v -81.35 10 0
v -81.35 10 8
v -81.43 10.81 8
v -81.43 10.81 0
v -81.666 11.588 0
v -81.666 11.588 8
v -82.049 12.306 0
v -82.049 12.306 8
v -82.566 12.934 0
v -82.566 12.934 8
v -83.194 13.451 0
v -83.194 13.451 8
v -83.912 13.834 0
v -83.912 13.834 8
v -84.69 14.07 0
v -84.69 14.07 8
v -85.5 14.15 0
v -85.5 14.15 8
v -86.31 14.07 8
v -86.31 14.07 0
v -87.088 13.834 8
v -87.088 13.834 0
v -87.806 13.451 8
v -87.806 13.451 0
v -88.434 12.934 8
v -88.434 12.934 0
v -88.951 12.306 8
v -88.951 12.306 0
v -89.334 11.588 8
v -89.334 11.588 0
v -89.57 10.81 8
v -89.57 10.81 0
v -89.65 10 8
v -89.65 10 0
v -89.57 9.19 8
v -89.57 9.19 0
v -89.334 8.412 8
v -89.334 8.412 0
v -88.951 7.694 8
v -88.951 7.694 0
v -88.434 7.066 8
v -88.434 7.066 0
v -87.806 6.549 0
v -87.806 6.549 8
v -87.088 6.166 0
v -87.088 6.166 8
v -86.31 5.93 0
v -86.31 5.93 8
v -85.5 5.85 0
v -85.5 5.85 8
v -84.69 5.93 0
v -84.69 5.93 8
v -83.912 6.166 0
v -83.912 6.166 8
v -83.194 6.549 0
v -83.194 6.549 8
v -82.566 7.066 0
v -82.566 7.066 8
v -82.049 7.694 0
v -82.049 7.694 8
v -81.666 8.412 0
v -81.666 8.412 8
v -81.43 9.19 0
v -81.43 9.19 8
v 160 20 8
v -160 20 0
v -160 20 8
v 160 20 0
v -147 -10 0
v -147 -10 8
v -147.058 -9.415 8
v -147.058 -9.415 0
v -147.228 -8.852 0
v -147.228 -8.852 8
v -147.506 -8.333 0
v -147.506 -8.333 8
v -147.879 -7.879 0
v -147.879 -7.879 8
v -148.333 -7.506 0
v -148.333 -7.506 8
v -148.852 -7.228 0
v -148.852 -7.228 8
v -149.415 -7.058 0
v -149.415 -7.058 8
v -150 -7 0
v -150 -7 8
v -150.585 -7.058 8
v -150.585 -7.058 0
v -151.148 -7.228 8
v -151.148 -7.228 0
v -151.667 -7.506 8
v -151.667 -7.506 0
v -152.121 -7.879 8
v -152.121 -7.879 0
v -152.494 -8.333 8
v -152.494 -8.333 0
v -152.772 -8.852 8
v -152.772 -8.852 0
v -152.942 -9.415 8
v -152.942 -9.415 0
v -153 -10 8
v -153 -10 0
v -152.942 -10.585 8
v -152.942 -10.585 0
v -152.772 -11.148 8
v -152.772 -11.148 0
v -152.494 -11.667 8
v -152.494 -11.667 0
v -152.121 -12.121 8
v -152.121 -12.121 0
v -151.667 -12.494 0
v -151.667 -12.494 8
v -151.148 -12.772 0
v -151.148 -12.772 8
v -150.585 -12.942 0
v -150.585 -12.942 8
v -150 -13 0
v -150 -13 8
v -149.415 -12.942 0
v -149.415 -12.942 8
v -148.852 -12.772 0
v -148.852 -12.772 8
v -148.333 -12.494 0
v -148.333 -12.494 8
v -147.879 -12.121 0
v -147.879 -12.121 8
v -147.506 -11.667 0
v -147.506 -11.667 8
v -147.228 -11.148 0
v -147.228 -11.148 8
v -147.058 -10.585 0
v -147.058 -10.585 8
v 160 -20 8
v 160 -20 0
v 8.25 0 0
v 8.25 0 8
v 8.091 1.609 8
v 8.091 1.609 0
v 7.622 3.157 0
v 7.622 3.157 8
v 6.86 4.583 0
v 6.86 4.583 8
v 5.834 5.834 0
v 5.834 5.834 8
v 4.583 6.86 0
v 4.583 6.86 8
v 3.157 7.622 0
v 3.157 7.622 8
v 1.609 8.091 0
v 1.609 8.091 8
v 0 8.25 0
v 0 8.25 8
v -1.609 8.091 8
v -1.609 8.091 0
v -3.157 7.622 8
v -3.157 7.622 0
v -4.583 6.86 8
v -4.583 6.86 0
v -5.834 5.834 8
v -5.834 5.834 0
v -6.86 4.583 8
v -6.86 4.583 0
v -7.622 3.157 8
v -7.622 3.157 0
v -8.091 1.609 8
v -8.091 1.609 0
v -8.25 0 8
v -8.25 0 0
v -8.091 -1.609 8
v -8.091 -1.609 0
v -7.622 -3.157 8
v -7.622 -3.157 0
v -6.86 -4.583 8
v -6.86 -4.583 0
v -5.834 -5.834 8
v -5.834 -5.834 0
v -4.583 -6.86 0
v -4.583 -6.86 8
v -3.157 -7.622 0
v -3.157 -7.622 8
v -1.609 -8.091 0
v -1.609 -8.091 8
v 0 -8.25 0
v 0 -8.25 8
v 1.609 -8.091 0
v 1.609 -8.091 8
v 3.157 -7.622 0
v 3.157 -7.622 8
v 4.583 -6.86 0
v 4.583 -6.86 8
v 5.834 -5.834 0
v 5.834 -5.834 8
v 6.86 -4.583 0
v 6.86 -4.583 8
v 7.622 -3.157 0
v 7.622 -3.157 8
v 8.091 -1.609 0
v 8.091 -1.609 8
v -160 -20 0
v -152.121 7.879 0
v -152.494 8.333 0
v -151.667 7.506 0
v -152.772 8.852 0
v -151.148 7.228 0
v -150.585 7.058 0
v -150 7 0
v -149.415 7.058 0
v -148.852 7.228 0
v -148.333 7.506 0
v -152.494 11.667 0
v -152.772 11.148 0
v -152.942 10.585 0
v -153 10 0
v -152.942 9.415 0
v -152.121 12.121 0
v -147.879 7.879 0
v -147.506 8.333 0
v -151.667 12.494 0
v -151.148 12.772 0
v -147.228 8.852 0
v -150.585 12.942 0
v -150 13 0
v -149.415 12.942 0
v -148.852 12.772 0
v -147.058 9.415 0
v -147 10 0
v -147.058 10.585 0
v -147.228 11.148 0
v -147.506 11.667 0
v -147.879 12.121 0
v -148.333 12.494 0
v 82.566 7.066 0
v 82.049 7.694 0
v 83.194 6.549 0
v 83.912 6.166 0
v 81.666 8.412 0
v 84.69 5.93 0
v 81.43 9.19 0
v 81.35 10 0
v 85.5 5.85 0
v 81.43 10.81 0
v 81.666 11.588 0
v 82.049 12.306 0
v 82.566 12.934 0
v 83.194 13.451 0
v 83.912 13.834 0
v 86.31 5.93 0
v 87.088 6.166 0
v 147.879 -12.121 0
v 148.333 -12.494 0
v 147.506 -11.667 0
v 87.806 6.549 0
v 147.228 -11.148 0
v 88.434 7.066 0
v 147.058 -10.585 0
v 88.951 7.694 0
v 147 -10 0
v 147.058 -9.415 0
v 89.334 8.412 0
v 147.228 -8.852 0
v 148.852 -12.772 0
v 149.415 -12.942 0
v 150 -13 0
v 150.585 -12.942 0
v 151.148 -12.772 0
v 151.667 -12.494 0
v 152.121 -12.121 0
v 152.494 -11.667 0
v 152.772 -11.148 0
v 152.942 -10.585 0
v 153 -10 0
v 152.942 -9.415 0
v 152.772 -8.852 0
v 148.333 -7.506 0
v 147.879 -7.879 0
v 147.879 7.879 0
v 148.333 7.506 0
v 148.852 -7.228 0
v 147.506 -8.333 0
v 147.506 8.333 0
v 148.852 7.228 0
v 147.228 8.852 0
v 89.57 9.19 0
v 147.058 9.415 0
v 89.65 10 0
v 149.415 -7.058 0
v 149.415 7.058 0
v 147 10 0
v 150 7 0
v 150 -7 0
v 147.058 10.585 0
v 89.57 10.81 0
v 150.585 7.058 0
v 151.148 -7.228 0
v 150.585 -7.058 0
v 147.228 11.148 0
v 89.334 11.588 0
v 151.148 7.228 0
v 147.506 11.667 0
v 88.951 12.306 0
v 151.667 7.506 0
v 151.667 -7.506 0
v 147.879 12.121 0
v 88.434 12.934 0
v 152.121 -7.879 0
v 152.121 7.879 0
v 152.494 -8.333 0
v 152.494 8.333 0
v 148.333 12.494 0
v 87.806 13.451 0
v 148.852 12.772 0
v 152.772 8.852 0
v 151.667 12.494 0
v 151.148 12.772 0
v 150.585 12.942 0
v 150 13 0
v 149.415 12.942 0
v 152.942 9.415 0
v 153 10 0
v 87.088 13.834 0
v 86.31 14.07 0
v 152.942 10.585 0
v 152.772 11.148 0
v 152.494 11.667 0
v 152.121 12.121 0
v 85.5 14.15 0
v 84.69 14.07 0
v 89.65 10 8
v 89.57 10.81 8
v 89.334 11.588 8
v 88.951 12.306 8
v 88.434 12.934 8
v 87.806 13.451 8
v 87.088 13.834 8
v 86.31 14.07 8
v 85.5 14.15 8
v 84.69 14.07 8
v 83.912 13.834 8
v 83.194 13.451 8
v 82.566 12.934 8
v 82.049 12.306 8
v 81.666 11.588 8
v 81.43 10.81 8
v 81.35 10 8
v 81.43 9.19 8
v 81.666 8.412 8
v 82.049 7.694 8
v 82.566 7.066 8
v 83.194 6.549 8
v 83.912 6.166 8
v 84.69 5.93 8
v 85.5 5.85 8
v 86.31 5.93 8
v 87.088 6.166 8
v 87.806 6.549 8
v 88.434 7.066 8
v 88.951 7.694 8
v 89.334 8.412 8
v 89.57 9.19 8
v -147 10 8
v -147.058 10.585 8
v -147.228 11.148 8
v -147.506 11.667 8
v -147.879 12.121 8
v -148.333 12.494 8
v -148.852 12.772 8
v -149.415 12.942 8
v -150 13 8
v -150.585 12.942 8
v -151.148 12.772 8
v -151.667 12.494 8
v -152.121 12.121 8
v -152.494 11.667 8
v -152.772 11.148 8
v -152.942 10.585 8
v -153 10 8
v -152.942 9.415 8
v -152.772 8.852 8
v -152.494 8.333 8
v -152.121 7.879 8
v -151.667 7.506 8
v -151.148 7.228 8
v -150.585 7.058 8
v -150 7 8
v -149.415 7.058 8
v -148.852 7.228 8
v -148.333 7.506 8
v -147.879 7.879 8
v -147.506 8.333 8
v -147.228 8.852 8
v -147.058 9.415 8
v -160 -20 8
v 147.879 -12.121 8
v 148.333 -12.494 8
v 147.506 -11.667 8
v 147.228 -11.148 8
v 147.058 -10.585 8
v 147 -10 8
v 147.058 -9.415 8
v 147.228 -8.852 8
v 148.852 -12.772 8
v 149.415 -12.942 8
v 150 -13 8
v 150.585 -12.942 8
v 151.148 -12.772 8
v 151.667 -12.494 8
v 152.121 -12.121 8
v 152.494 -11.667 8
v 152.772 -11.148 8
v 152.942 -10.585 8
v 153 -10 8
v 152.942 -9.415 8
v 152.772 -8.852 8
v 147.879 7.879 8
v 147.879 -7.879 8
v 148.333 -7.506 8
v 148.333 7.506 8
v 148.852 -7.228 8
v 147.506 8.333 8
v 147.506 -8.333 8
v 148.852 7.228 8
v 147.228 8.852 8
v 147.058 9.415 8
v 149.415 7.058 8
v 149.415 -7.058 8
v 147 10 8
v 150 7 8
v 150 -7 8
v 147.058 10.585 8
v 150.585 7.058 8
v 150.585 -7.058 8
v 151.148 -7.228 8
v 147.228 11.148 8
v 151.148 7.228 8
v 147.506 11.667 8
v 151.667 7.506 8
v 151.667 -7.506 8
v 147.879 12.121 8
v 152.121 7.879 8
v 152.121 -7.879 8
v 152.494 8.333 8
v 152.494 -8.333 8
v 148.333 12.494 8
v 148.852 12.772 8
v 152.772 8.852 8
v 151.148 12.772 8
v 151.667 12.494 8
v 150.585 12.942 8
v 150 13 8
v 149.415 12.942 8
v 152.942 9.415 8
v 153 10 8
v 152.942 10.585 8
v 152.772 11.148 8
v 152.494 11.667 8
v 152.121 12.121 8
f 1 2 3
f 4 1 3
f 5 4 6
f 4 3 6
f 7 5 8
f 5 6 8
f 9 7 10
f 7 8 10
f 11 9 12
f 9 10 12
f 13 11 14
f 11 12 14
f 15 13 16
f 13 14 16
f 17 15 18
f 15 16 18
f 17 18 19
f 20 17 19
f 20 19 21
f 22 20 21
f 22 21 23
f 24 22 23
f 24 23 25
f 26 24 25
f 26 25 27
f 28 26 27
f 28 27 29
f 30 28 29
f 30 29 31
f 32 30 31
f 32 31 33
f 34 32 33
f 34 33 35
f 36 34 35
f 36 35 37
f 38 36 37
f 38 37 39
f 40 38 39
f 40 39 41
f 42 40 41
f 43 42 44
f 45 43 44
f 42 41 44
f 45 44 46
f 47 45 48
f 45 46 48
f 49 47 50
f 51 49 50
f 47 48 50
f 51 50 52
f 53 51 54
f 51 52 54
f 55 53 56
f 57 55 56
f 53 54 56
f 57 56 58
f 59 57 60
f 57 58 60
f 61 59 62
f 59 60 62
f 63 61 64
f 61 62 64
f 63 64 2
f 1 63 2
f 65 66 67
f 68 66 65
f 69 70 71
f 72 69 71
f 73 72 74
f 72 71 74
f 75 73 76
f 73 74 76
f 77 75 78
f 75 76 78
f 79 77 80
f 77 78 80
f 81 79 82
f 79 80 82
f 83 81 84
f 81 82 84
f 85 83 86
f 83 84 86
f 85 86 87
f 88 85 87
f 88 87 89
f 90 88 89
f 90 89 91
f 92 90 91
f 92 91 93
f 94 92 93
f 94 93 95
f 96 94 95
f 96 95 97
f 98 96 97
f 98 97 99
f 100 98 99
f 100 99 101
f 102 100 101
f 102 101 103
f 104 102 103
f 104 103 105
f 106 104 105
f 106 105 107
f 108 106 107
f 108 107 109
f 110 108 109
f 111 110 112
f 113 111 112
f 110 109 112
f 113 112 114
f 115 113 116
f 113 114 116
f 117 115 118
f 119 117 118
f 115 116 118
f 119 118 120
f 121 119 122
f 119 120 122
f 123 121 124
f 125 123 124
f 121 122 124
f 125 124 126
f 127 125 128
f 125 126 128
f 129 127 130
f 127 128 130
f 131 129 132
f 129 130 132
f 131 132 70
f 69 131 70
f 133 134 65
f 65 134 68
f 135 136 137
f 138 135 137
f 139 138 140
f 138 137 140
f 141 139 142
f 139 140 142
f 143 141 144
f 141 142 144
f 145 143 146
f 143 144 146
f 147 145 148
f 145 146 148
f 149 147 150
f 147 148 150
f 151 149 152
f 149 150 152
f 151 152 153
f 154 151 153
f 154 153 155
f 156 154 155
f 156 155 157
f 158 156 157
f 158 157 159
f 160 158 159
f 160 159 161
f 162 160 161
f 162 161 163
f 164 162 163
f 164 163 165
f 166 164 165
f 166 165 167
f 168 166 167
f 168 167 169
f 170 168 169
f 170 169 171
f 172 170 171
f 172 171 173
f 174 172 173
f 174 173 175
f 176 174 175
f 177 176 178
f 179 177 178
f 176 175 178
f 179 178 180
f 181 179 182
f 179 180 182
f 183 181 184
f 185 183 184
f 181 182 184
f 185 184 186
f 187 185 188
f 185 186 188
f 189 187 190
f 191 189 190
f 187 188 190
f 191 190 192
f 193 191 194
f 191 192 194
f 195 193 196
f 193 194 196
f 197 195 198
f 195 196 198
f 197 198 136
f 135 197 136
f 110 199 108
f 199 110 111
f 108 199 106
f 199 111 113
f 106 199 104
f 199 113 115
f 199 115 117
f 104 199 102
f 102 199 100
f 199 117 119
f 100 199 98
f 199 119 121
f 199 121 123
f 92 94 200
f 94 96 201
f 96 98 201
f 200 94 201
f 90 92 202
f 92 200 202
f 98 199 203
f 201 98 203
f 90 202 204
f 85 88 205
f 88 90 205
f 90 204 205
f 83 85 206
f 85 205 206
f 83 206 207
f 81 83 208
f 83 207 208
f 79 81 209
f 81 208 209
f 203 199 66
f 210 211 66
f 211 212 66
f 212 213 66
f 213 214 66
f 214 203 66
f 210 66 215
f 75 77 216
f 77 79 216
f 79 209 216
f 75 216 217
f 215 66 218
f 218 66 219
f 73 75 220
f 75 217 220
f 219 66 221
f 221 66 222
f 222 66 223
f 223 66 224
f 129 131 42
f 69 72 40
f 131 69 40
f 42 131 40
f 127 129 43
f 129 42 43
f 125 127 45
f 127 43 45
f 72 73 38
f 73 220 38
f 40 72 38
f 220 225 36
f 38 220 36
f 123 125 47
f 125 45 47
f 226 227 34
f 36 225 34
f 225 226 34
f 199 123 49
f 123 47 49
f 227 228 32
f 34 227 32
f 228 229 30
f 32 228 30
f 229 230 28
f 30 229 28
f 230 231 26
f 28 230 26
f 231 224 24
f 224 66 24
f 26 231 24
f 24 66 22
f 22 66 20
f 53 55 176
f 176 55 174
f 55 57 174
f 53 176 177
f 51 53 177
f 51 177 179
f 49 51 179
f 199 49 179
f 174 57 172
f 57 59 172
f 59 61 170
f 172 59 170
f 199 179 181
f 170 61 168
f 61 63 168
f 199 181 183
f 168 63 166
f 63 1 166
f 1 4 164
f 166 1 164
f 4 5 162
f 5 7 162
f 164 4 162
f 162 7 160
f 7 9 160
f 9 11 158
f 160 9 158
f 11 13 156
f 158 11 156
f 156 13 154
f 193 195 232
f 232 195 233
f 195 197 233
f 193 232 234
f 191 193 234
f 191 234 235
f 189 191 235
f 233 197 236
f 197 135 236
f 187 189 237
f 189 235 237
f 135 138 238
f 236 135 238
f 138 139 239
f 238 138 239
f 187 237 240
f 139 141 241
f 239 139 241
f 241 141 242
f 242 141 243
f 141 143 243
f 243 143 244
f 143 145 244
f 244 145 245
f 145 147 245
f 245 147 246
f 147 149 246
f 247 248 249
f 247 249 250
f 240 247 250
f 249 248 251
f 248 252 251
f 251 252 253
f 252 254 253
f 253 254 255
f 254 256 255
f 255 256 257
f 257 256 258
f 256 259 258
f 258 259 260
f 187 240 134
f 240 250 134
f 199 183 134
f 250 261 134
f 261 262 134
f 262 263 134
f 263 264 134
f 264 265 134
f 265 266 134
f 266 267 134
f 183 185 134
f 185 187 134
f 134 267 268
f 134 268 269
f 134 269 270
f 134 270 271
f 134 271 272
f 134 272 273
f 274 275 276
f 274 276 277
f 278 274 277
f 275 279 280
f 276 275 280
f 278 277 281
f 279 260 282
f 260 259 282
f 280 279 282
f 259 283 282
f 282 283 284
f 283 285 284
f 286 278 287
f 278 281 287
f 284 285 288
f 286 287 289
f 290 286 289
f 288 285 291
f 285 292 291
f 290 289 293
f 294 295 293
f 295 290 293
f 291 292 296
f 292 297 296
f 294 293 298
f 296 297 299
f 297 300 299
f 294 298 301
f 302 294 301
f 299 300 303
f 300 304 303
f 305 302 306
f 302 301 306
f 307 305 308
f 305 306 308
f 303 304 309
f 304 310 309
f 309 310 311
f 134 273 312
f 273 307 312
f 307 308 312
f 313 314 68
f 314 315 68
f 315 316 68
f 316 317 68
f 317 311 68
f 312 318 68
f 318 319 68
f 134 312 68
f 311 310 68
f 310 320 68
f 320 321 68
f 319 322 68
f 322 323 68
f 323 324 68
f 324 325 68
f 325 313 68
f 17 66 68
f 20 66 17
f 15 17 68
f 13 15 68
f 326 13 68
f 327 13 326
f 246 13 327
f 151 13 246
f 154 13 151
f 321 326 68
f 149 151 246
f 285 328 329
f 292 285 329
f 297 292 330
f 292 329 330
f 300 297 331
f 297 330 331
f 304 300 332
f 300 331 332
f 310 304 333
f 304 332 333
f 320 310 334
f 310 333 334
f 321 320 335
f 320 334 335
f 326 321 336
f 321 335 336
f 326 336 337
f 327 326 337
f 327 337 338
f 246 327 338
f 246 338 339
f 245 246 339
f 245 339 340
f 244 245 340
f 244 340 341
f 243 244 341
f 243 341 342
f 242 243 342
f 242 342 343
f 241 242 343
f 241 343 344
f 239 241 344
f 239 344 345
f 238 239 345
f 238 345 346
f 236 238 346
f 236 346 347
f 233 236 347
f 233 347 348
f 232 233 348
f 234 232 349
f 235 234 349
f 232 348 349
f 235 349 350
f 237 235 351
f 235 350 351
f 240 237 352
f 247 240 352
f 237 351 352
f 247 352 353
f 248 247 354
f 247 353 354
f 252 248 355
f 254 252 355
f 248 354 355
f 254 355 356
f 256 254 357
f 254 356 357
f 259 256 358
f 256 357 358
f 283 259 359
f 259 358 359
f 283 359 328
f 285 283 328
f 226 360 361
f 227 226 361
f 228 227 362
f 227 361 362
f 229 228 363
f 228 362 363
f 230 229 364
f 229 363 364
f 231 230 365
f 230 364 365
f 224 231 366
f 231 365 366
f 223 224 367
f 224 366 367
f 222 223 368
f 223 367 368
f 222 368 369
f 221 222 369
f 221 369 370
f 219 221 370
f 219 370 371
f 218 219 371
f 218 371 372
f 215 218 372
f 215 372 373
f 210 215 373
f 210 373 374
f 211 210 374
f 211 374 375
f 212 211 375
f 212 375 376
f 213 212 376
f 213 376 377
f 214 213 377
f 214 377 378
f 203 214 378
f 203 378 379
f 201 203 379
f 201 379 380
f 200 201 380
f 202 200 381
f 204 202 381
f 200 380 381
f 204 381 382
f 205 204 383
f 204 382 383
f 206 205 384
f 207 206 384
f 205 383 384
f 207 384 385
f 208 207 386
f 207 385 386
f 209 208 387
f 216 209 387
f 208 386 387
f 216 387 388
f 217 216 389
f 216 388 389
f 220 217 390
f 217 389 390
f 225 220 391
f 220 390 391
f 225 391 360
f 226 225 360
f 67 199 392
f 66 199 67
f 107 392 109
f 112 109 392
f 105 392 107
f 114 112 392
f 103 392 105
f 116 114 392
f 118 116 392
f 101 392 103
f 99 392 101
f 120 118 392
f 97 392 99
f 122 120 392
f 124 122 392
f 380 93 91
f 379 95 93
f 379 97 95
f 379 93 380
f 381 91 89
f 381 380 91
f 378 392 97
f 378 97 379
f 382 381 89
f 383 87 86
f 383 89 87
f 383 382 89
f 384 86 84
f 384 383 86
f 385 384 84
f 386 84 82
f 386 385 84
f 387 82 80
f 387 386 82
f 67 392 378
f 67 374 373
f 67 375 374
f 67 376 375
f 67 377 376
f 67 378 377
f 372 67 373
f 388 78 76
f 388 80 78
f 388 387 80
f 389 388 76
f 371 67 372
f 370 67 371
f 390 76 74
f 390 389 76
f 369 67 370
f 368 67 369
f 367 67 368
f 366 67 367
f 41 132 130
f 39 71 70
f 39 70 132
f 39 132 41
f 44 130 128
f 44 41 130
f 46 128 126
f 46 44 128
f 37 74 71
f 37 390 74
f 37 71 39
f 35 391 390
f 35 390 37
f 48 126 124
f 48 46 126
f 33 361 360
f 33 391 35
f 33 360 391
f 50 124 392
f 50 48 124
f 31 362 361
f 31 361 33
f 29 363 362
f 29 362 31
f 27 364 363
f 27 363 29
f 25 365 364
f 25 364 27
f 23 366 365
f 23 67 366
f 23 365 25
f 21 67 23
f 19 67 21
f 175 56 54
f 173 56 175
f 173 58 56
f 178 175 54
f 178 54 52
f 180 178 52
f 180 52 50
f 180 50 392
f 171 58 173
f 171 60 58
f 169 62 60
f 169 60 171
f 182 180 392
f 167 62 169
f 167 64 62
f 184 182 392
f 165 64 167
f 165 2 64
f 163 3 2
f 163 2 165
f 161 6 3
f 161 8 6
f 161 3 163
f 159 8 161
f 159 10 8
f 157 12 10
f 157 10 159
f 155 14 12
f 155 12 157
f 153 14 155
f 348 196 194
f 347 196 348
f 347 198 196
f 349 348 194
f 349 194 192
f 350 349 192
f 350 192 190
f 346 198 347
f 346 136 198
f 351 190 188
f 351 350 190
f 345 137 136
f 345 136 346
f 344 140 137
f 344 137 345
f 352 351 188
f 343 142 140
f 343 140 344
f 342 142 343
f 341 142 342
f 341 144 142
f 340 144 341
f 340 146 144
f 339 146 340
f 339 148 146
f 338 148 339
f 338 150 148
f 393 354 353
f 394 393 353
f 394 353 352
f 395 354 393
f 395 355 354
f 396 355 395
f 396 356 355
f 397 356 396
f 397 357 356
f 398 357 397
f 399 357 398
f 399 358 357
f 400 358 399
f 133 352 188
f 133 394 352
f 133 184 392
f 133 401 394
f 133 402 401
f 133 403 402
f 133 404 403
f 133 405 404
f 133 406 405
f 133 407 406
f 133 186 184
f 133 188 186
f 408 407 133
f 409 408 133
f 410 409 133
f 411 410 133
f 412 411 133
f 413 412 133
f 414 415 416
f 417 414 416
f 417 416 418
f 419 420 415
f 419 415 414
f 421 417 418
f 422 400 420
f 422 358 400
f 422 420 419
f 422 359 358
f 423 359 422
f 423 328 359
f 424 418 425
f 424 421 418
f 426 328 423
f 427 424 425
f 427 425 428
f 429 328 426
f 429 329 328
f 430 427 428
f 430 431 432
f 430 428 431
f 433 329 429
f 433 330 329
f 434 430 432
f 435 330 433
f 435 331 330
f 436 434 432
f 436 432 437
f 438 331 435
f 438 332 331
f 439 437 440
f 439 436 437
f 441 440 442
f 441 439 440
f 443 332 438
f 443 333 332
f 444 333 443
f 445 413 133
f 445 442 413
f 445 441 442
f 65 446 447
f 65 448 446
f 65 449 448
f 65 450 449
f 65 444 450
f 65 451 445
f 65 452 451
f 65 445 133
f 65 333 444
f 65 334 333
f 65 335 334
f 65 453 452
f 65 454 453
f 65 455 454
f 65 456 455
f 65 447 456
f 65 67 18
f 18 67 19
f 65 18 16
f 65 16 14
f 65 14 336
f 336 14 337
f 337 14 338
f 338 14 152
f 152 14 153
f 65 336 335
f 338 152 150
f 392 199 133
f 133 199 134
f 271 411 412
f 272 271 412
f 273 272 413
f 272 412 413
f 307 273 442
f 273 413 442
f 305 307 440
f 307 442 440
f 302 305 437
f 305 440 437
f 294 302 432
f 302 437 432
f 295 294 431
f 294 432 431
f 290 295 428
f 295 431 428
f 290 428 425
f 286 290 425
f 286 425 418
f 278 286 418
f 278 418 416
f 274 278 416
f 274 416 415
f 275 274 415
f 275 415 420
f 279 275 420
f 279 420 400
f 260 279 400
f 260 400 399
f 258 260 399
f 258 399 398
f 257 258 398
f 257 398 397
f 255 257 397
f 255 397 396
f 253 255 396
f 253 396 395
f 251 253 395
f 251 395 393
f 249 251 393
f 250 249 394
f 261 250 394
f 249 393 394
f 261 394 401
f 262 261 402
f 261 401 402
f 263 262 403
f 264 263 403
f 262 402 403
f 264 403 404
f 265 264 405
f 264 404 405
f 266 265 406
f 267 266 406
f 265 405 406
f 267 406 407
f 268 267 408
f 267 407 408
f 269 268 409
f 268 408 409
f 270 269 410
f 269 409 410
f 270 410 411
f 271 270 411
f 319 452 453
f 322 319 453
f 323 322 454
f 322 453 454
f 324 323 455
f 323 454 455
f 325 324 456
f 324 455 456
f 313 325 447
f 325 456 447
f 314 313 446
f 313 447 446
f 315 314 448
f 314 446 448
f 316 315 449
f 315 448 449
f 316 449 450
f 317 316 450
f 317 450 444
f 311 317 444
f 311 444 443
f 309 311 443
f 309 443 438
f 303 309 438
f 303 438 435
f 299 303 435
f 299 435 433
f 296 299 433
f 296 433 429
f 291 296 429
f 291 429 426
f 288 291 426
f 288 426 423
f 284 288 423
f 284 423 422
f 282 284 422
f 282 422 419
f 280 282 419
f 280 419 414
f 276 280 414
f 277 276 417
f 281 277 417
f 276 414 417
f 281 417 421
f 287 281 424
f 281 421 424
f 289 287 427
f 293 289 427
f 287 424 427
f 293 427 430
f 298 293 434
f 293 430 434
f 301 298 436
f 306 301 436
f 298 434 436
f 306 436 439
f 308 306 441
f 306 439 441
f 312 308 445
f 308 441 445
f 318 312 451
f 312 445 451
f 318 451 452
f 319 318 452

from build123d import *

# Parameters (mm, degrees)
SKETCH1_W           = 320
SKETCH1_H           = 40
BOSS_EXTRUDE1_DEPTH = 8
CUT_EXTRUDE1_REACH  = 10
SKETCH2_R           = 3
CUT_EXTRUDE2_REACH  = 10
SKETCH3_R           = 4.15
SKETCH3_R_2         = 8.25


with BuildPart() as part:
    # Sketch1 → Boss-Extrude1 (new body)
    with BuildSketch(Plane.XY):
        Rectangle(SKETCH1_W, SKETCH1_H)
    extrude(amount=BOSS_EXTRUDE1_DEPTH)

    # Sketch2 → Cut-Extrude1 (cut, up to next)
    with BuildSketch(Plane.XY.offset(8), mode=Mode.PRIVATE) as cut_extrude1_sk1:
        with Locations((-150, 10)):
            Circle(SKETCH2_R)
    cut_extrude1_tool1 = extrude(cut_extrude1_sk1.sketch, amount=-CUT_EXTRUDE1_REACH, mode=Mode.PRIVATE) & part.part
    add(cut_extrude1_tool1.solids().sort_by_distance((-150, 10, 8))[0], mode=Mode.SUBTRACT)
    # Sketch2 → Cut-Extrude1 (cut, up to next)
    with BuildSketch(Plane.XY.offset(8), mode=Mode.PRIVATE) as cut_extrude1_sk2:
        with Locations((-150, -10)):
            Circle(SKETCH2_R)
    cut_extrude1_tool2 = extrude(cut_extrude1_sk2.sketch, amount=-CUT_EXTRUDE1_REACH, mode=Mode.PRIVATE) & part.part
    add(cut_extrude1_tool2.solids().sort_by_distance((-150, -10, 8))[0], mode=Mode.SUBTRACT)
    # Sketch2 → Cut-Extrude1 (cut, up to next)
    with BuildSketch(Plane.XY.offset(8), mode=Mode.PRIVATE) as cut_extrude1_sk3:
        with Locations((150, -10)):
            Circle(SKETCH2_R)
    cut_extrude1_tool3 = extrude(cut_extrude1_sk3.sketch, amount=-CUT_EXTRUDE1_REACH, mode=Mode.PRIVATE) & part.part
    add(cut_extrude1_tool3.solids().sort_by_distance((150, -10, 8))[0], mode=Mode.SUBTRACT)
    # Sketch2 → Cut-Extrude1 (cut, up to next)
    with BuildSketch(Plane.XY.offset(8), mode=Mode.PRIVATE) as cut_extrude1_sk4:
        with Locations((150, 10)):
            Circle(SKETCH2_R)
    cut_extrude1_tool4 = extrude(cut_extrude1_sk4.sketch, amount=-CUT_EXTRUDE1_REACH, mode=Mode.PRIVATE) & part.part
    add(cut_extrude1_tool4.solids().sort_by_distance((150, 10, 8))[0], mode=Mode.SUBTRACT)

    # Sketch3 → Cut-Extrude2 (cut, up to next)
    with BuildSketch(Plane.XY.offset(8), mode=Mode.PRIVATE) as cut_extrude2_sk1:
        with Locations((-85.5, 10)):
            Circle(SKETCH3_R)
    cut_extrude2_tool1 = extrude(cut_extrude2_sk1.sketch, amount=-CUT_EXTRUDE2_REACH, mode=Mode.PRIVATE) & part.part
    add(cut_extrude2_tool1.solids().sort_by_distance((-85.5, 10, 8))[0], mode=Mode.SUBTRACT)
    # Sketch3 → Cut-Extrude2 (cut, up to next)
    with BuildSketch(Plane.XY.offset(8), mode=Mode.PRIVATE) as cut_extrude2_sk2:
        with Locations((85.5, 10)):
            Circle(SKETCH3_R)
    cut_extrude2_tool2 = extrude(cut_extrude2_sk2.sketch, amount=-CUT_EXTRUDE2_REACH, mode=Mode.PRIVATE) & part.part
    add(cut_extrude2_tool2.solids().sort_by_distance((85.5, 10, 8))[0], mode=Mode.SUBTRACT)
    # Sketch3 → Cut-Extrude2 (cut, up to next)
    with BuildSketch(Plane.XY.offset(8), mode=Mode.PRIVATE) as cut_extrude2_sk3:
        Circle(SKETCH3_R_2)
    cut_extrude2_tool3 = extrude(cut_extrude2_sk3.sketch, amount=-CUT_EXTRUDE2_REACH, mode=Mode.PRIVATE) & part.part
    add(cut_extrude2_tool3.solids().sort_by_distance((0, 0, 8))[0], mode=Mode.SUBTRACT)


solid = part.part
